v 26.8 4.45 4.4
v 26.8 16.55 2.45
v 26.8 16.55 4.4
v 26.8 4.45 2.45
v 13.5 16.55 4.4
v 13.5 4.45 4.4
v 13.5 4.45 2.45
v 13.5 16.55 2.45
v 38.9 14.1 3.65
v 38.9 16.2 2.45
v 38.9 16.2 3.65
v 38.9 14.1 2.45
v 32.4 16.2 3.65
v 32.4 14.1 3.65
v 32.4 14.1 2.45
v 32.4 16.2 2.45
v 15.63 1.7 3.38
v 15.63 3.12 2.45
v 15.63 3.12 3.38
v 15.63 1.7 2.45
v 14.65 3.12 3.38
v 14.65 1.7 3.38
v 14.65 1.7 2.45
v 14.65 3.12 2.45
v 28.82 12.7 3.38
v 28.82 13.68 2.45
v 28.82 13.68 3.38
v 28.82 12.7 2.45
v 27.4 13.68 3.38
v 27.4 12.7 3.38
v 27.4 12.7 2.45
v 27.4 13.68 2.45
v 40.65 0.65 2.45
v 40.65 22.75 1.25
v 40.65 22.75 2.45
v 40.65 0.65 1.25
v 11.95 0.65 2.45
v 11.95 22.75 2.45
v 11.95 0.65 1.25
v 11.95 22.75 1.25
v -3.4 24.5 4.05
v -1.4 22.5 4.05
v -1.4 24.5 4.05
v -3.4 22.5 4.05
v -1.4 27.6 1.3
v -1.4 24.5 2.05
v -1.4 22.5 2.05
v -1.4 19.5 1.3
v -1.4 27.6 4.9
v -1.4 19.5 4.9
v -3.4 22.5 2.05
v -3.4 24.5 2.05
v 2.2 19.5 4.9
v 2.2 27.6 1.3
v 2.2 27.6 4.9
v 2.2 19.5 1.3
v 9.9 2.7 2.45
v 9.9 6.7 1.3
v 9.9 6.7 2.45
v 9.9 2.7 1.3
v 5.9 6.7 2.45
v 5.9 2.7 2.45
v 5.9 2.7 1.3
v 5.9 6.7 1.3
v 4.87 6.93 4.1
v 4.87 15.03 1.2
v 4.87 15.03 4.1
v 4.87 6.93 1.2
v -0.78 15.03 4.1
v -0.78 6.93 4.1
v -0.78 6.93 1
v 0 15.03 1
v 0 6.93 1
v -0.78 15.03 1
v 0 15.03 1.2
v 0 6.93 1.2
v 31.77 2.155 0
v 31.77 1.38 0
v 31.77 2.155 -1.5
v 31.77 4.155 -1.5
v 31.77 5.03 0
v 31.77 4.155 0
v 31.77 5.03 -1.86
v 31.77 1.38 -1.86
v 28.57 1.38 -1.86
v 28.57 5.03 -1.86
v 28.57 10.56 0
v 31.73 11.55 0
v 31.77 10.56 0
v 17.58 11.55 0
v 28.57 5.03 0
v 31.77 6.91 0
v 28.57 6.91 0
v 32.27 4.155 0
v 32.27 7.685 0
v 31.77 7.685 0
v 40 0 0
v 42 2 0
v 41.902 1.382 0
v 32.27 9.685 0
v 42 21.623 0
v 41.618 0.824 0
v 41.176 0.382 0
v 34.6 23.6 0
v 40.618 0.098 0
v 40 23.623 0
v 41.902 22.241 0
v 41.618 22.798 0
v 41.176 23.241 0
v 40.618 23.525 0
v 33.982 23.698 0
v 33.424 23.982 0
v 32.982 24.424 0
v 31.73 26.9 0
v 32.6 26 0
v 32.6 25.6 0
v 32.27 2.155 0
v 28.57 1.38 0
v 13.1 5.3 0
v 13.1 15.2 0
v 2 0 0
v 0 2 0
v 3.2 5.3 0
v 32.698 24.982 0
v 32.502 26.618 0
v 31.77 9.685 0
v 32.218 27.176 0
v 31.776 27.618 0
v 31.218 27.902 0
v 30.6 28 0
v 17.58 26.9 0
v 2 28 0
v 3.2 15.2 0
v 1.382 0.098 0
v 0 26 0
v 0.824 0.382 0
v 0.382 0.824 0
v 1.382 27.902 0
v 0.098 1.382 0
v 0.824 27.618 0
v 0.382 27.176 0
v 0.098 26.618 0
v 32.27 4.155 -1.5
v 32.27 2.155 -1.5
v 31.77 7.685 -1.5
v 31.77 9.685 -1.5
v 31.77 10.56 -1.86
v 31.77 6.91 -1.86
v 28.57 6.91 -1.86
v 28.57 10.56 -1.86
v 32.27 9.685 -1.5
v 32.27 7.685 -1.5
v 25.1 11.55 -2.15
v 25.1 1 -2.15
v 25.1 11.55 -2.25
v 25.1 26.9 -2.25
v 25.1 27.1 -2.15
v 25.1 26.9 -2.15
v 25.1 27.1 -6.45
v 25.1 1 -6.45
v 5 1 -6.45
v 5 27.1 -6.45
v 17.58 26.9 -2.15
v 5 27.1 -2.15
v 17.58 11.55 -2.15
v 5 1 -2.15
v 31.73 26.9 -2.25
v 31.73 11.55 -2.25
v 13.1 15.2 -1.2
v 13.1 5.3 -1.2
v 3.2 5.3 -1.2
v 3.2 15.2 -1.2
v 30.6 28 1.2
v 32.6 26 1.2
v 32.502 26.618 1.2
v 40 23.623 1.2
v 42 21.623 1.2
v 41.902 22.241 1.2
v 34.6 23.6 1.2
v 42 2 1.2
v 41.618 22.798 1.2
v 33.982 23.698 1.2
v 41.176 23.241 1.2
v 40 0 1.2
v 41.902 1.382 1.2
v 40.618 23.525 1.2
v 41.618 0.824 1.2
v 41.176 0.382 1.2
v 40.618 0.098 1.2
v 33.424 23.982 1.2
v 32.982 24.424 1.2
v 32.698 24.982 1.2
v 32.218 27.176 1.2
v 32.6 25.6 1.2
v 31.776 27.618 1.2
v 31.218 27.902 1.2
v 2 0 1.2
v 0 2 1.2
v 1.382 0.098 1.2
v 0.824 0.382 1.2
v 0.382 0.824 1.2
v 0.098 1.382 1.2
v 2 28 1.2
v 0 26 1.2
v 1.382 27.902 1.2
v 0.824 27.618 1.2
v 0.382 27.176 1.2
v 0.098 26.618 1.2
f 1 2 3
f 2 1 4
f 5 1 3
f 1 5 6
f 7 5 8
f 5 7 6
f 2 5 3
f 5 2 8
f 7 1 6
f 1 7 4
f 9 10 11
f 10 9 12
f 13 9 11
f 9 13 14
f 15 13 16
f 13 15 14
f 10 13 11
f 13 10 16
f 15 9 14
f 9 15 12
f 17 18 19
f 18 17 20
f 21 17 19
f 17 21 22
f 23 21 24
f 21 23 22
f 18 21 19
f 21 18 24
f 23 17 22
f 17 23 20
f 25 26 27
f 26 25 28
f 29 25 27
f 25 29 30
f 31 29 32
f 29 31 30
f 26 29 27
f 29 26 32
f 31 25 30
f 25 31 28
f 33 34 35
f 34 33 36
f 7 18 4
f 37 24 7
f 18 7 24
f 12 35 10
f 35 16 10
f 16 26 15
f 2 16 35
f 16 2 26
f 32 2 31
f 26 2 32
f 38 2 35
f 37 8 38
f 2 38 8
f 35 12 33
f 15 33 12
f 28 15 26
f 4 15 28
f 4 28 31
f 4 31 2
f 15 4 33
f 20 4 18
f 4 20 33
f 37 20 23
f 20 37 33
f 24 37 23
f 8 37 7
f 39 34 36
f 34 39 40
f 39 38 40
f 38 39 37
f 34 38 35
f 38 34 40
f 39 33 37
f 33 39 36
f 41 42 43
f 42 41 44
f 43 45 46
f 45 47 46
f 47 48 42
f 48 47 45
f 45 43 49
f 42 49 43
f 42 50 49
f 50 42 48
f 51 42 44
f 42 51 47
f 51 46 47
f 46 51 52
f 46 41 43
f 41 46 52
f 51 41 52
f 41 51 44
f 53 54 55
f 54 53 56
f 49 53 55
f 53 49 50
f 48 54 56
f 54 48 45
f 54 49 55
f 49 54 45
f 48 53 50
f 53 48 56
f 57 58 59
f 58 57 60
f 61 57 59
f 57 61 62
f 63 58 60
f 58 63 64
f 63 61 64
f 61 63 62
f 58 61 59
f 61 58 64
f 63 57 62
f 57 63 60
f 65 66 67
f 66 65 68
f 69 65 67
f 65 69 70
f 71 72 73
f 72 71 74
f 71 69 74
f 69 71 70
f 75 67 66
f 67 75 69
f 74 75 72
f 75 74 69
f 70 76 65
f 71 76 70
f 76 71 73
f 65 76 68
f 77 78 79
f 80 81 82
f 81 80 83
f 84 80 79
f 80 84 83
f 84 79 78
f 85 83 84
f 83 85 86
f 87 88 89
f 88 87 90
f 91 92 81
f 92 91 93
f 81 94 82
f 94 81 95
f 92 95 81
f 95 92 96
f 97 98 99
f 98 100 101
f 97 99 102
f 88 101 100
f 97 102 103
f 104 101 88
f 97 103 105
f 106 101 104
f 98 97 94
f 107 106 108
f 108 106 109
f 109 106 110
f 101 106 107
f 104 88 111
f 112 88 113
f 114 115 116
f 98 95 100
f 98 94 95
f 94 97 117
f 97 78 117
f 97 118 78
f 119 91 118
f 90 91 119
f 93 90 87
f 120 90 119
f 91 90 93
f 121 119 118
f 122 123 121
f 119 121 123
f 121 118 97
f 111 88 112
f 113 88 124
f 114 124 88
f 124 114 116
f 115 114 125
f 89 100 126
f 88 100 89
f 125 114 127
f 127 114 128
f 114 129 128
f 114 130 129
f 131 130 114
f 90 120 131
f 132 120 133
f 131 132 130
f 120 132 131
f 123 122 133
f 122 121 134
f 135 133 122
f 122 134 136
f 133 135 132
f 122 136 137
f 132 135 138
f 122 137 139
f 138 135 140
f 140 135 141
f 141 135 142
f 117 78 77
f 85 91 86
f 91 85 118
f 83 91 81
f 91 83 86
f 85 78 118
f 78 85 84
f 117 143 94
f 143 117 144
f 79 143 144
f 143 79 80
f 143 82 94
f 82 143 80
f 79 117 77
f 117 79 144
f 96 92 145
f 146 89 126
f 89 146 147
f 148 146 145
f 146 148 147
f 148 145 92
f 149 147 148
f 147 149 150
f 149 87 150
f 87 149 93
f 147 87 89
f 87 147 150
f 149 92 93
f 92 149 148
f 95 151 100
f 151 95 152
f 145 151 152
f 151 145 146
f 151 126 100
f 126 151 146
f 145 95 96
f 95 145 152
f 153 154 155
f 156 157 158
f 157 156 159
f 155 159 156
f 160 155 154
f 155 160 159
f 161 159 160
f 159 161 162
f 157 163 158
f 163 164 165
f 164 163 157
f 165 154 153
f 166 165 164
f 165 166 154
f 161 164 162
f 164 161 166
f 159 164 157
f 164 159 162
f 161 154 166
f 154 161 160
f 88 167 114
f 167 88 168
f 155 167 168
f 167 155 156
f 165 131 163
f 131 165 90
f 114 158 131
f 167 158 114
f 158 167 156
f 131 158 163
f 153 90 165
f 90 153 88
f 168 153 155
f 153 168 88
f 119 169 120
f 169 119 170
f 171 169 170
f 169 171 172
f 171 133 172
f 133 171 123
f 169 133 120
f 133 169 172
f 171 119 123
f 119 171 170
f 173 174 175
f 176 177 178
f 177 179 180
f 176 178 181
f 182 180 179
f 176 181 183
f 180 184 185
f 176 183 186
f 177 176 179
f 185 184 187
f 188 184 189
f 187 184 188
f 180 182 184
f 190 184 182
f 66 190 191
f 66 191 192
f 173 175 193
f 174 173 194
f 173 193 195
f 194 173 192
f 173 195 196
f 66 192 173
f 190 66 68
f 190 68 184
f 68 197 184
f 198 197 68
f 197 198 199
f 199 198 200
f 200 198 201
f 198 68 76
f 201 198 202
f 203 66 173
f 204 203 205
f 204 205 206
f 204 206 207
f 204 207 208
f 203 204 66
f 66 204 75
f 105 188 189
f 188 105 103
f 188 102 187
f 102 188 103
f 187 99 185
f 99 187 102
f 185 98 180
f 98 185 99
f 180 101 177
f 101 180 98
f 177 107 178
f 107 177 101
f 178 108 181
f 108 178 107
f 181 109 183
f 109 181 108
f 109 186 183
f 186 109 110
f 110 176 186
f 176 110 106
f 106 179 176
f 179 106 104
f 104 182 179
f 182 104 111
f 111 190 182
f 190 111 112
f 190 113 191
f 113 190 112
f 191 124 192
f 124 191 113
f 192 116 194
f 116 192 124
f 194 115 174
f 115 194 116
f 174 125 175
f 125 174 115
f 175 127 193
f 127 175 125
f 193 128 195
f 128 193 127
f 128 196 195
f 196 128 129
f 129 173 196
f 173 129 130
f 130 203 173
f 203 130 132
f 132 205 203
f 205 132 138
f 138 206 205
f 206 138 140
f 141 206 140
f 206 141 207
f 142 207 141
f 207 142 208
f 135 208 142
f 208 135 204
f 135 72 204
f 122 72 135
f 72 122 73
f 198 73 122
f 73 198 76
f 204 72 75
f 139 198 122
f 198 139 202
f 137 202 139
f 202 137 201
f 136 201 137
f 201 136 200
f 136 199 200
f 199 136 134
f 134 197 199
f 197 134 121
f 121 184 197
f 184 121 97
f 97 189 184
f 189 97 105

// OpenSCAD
// file: WIMUv4pcbv1.scad
external_max = [42,28];
cutout=[9.4,4.4];
corner_r=2;
PCB_t=1.2;
no_of_sides=5;


wimuv4_2013_pcb();
/*
difference(){
	square(size=external_max);
	square(size=cutout);
}
*/

module wimuv4_2013_pcb(external_max = [42,28],
cutout=[9.4,4.4],
corner_r=2,
PCB_t=1.2,
no_of_sides=5){
	linear_extrude(height=PCB_t){
		translate(v=external_max)rotate(a=180)minkowski(){
			difference(){
				translate(v=[corner_r,corner_r])square(size=external_max-[2*corner_r,2*corner_r]);
				//square(size=cutout+[corner_r,corner_r]);
				hull(){
					circle(r=2*corner_r);
					translate(v=cutout-[corner_r,corner_r]) circle(r=2*corner_r, $fn=no_of_sides*4);
					translate(v=[0,cutout[1]-corner_r]) circle(r=2*corner_r);
					translate(v=[cutout[0]-corner_r,0]) circle(r=2*corner_r);
	
				}
			}
			circle(r=corner_r, $fn=no_of_sides*4);
		}
	}
}
// main file
 /*!
@brief 25mm Mote layer Battery
@details This OpenSCAD script will generate a tyndall 25mm mote battery layer based on autocad dxf drawing 25mmmotelayerzigbee2.dxf

@author Mark Gaffney
@version 0.1
@date 2013_03_28 ISO Standard YYYY_MM_DD format

@todo

@warning
This is not for printing but more so for getting a general idea of whether or not your enclosure will fit Tyndall motes correctly

@note

v0.1
 - 	first attempt based on 25mm_mote_layer_battery_v0.3.scad
Changes from previous versions:
0.3 2013_03_28
 - 	added functionality and control for switch
 - 	DXF seems to be generating strange geometry, perhaps openscad's dxf support has been changed or file is corrupted?
0.2
 - secodn attempt based on v0.3
0.1
 - 	first attempt based on 25mm_mote_layer_zigbee_v0.2.scad

@attention
Copyright (c) 2011 Tyndall National Institute.
All rights reserved.
Permission to use, copy, modify, and distribute this software and its documentation for any purpose, without fee, and without written agreement is hereby granted, provided that the above copyright notice and the following two paragraphs appear in all copies of this software. 

IN NO EVENT SHALL TYNDALL NATIONAL INSTITUTE BE LIABLE TO ANY PARTY FOR DIRECT, INDIRECT, SPECIAL, INCIDENTAL, OR CONSEQUENTIAL DAMAGES ARISING OUT OF THE USE OF THIS SOFTWARE AND ITS DOCUMENTATION, EVEN IF TYNDALL NATIONAL INSTITUTE HAS BEEN ADVISED OF THE POSSIBILITY OF SUCH DAMAGE.

TYNDALL NATIONAL INSTITUTE SPECIFICALLY DISCLAIMS ANY WARRANTIES, INCLUDING, BUT NOT LIMITED TO, THE IMPLIED WARRANTIES OF MERCHANTABILITY AND FITNESS FOR A PARTICULAR PURPOSE.  THE SOFTWARE PROVIDED HEREUNDER IS ON AN "AS IS" BASIS, AND TYNDALL NATIONAL INSTITUTE HAS NO OBLIGATION TO PROVIDE MAINTENANCE, SUPPORT, UPDATES, ENHANCEMENTS, OR MODIFICATIONS.
*/

//***********Pre*Defined*Variables**************
a_bit=0.01;//This is used to help with manifoldness during difference operations

//h_PCB=1.2;
h_PCB=1.3;

e_antenna=0.9;
//**************User*Variables*****************
expand = [0.1,0.1,0.1];//how much larger should I make things in each direction?
has_antenna=0;
has_uUSB=1;
has_battery=true;
has_battery_top=0;
has_switch=1;
switch_state=0;//0,1

bottom_comp_max_h = 2.15;//uSD holder
top_comp_max_h = 3.1;

//bottom components

usd_size_lbh =[14.05,15.25,2.15];
usd_off_xyz =[17.58,11.55,0];

//atmel
atmel_size_lbh=[9.8,9.8,1.1];
atmel_off_xyz=[3.2,5.3,0];

//orientation1
battery_bottom_size_lbh=[20,26,4.2];
//battery_bottom_size_lbh=[20.5,26.5,4.4];//with a bit extra
battery_bottom_off_xyz=[5,1,bottom_comp_max_h];
//battery_bottom_off_xyz=[5,1,bottom_comp_max_h-0.2];////with a bit extra
//orientation2
//battery_bottom_size_lbh=[26,20,4.2];
//battery_bottom_off_xyz=[5,1,bottom_comp_max_h];

//has_underneath switches=true
//reset_switch
reset_switch_size_lbh=[3.1,3.55,1.76];
reset_switch_off_xyz=[28.57,1.38,0];
//bootload_switch
bootload_switch_size_lbh=[3.1,3.55,1.76];
bootload_switch_off_xyz=[28.57,6.91,0];

//top components

//orientation3
//battery_top_size_lbh=[20,26,4.2];
//battery_top_off_xyz=[5,1,top_comp_max_h];
//orientation4
//battery_top_size_lbh=[26,20,4.2];
//battery_top_off_xyz=[5,1,top_comp_max_h];

//single chip imu Invensense MPU 9150
mpu_size_lbh=[4,4,1.15];
mpu_off_xyz=[5.9,2.7,0];

usb_size_lbh=[5.55,8,3];
usb_off_xyz=[-0.78,6.93,-0.3];

switch_size_lbh =[3.5,8,3.5];
switch_off_xyz =[-1.4,19.5,0];

//Redpine wifi board parts
has_wifi=1;
wifi_pcb_size_lbh=[28.6,22,1.1];
wifi_pcb_off_xyz=[12,0.7,0];
	//wifi_led1
wifi_led1_size_lbh=[0.88,1.32,0.88];
wifi_led1_off_xyz=[2.65,1,0];
	//wifi_led2
wifi_led2_size_lbh=[1.32,0.88,0.88];
wifi_led2_off_xyz=[15.4,12,0];
	//wifi chip
wifi_chip_size_lbh=[13.2,12,1.9];
wifi_chip_off_xyz=[1.5,3.75,0];
	//wifi antenna
wifi_ant_size_lbh=[6.4,2,1.15];
wifi_ant_off_xyz=[20.4,13.4,0];

use <WIMUv4pcbv1.scad>;
//*********************Calls*******************
translate(v=[0,0,0]){
	wimuv4_2013_device(has_uUSB, has_battery,has_switch);
}

//*********************Modules******************* 
module wimuv4_2013_device(has_uUSB_l,has_battery_l,has_switch_l) {
	translate(v=[0,0,0]){
		wimuv4_2013_pcb();

//top components
		translate(v=[0,0,h_PCB]){

			if(has_battery && has_battery_top==1) translate(v=battery_top_off_xyz) color("cyan")cube(size=battery_top_size_lbh,center=false);
			translate(v=mpu_off_xyz) color("green")cube(size=mpu_size_lbh,center=false); //MPU single chip IMU  

			if(has_wifi==1) translate(v=wifi_pcb_off_xyz) color("red"){
				translate(v=-expand/2) cube(size=wifi_pcb_size_lbh + expand,center=false); //WiFi module PCB
				translate(v=[0,0,wifi_pcb_size_lbh[2]]){
					translate(v=wifi_chip_off_xyz) 	cube(size=wifi_chip_size_lbh +expand,center=false); //WiFi 
					translate(v=wifi_ant_off_xyz) 	cube(size=wifi_ant_size_lbh +expand,center=false); //WiFi 
					translate(v=wifi_led1_off_xyz) 	cube(size=wifi_led1_size_lbh +expand,center=false); //WiFi 
					translate(v=wifi_led2_off_xyz) 	cube(size=wifi_led2_size_lbh +expand,center=false); //WiFi 
	
	//				translate(v=wifi_ _off_xyz) cube(size=wifi_ _size_lbh,center=false); //WiFi 
				}
			}
			if(has_uUSB_l==1) translate(v=usb_off_xyz) color("grey")cube(size=usb_size_lbh+expand,center=false); //uUSB
	
			if(has_switch_l==1)translate(v=switch_off_xyz){
				echo("has switch");
				mirror(v=[1,0,0]) translate(v=[0,(switch_size_lbh[1]-2)/2 + switch_state*2,(switch_size_lbh[2]-2)/2]) color("black") cube(size=2,center=false);
				color("silver") cube(size=switch_size_lbh + expand,center=false);
			}
		}
//otherwise bottom component
		mirror(v=[0,0,1]){
			if(has_battery && has_battery_top==0) translate(v=battery_bottom_off_xyz) color("cyan")cube(size=battery_bottom_size_lbh + expand,center=false);

			translate(v=usd_off_xyz) color("blue") cube(size=usd_size_lbh + expand,center=false);//uSD card slot
			translate(v=atmel_off_xyz) color("orange") cube(size=atmel_size_lbh + expand,center=false);//atmel chip
			translate(v=reset_switch_off_xyz) {
				color("violet") cube(size=reset_switch_size_lbh + expand,center=false);
				color("black") translate(v=[reset_switch_size_lbh[0],(reset_switch_size_lbh[1]-2)/2,0])cube(size=[0.6,2,1.5],center=false);
			}
			translate(v=bootload_switch_off_xyz) {
				color("indigo") cube(size=bootload_switch_size_lbh + expand,center=false);
				color("black") translate(v=[bootload_switch_size_lbh[0],(bootload_switch_size_lbh[1]-2)/2,0])cube(size=[0.6,2,1.5],center=false);
			}

		}
	}
}
